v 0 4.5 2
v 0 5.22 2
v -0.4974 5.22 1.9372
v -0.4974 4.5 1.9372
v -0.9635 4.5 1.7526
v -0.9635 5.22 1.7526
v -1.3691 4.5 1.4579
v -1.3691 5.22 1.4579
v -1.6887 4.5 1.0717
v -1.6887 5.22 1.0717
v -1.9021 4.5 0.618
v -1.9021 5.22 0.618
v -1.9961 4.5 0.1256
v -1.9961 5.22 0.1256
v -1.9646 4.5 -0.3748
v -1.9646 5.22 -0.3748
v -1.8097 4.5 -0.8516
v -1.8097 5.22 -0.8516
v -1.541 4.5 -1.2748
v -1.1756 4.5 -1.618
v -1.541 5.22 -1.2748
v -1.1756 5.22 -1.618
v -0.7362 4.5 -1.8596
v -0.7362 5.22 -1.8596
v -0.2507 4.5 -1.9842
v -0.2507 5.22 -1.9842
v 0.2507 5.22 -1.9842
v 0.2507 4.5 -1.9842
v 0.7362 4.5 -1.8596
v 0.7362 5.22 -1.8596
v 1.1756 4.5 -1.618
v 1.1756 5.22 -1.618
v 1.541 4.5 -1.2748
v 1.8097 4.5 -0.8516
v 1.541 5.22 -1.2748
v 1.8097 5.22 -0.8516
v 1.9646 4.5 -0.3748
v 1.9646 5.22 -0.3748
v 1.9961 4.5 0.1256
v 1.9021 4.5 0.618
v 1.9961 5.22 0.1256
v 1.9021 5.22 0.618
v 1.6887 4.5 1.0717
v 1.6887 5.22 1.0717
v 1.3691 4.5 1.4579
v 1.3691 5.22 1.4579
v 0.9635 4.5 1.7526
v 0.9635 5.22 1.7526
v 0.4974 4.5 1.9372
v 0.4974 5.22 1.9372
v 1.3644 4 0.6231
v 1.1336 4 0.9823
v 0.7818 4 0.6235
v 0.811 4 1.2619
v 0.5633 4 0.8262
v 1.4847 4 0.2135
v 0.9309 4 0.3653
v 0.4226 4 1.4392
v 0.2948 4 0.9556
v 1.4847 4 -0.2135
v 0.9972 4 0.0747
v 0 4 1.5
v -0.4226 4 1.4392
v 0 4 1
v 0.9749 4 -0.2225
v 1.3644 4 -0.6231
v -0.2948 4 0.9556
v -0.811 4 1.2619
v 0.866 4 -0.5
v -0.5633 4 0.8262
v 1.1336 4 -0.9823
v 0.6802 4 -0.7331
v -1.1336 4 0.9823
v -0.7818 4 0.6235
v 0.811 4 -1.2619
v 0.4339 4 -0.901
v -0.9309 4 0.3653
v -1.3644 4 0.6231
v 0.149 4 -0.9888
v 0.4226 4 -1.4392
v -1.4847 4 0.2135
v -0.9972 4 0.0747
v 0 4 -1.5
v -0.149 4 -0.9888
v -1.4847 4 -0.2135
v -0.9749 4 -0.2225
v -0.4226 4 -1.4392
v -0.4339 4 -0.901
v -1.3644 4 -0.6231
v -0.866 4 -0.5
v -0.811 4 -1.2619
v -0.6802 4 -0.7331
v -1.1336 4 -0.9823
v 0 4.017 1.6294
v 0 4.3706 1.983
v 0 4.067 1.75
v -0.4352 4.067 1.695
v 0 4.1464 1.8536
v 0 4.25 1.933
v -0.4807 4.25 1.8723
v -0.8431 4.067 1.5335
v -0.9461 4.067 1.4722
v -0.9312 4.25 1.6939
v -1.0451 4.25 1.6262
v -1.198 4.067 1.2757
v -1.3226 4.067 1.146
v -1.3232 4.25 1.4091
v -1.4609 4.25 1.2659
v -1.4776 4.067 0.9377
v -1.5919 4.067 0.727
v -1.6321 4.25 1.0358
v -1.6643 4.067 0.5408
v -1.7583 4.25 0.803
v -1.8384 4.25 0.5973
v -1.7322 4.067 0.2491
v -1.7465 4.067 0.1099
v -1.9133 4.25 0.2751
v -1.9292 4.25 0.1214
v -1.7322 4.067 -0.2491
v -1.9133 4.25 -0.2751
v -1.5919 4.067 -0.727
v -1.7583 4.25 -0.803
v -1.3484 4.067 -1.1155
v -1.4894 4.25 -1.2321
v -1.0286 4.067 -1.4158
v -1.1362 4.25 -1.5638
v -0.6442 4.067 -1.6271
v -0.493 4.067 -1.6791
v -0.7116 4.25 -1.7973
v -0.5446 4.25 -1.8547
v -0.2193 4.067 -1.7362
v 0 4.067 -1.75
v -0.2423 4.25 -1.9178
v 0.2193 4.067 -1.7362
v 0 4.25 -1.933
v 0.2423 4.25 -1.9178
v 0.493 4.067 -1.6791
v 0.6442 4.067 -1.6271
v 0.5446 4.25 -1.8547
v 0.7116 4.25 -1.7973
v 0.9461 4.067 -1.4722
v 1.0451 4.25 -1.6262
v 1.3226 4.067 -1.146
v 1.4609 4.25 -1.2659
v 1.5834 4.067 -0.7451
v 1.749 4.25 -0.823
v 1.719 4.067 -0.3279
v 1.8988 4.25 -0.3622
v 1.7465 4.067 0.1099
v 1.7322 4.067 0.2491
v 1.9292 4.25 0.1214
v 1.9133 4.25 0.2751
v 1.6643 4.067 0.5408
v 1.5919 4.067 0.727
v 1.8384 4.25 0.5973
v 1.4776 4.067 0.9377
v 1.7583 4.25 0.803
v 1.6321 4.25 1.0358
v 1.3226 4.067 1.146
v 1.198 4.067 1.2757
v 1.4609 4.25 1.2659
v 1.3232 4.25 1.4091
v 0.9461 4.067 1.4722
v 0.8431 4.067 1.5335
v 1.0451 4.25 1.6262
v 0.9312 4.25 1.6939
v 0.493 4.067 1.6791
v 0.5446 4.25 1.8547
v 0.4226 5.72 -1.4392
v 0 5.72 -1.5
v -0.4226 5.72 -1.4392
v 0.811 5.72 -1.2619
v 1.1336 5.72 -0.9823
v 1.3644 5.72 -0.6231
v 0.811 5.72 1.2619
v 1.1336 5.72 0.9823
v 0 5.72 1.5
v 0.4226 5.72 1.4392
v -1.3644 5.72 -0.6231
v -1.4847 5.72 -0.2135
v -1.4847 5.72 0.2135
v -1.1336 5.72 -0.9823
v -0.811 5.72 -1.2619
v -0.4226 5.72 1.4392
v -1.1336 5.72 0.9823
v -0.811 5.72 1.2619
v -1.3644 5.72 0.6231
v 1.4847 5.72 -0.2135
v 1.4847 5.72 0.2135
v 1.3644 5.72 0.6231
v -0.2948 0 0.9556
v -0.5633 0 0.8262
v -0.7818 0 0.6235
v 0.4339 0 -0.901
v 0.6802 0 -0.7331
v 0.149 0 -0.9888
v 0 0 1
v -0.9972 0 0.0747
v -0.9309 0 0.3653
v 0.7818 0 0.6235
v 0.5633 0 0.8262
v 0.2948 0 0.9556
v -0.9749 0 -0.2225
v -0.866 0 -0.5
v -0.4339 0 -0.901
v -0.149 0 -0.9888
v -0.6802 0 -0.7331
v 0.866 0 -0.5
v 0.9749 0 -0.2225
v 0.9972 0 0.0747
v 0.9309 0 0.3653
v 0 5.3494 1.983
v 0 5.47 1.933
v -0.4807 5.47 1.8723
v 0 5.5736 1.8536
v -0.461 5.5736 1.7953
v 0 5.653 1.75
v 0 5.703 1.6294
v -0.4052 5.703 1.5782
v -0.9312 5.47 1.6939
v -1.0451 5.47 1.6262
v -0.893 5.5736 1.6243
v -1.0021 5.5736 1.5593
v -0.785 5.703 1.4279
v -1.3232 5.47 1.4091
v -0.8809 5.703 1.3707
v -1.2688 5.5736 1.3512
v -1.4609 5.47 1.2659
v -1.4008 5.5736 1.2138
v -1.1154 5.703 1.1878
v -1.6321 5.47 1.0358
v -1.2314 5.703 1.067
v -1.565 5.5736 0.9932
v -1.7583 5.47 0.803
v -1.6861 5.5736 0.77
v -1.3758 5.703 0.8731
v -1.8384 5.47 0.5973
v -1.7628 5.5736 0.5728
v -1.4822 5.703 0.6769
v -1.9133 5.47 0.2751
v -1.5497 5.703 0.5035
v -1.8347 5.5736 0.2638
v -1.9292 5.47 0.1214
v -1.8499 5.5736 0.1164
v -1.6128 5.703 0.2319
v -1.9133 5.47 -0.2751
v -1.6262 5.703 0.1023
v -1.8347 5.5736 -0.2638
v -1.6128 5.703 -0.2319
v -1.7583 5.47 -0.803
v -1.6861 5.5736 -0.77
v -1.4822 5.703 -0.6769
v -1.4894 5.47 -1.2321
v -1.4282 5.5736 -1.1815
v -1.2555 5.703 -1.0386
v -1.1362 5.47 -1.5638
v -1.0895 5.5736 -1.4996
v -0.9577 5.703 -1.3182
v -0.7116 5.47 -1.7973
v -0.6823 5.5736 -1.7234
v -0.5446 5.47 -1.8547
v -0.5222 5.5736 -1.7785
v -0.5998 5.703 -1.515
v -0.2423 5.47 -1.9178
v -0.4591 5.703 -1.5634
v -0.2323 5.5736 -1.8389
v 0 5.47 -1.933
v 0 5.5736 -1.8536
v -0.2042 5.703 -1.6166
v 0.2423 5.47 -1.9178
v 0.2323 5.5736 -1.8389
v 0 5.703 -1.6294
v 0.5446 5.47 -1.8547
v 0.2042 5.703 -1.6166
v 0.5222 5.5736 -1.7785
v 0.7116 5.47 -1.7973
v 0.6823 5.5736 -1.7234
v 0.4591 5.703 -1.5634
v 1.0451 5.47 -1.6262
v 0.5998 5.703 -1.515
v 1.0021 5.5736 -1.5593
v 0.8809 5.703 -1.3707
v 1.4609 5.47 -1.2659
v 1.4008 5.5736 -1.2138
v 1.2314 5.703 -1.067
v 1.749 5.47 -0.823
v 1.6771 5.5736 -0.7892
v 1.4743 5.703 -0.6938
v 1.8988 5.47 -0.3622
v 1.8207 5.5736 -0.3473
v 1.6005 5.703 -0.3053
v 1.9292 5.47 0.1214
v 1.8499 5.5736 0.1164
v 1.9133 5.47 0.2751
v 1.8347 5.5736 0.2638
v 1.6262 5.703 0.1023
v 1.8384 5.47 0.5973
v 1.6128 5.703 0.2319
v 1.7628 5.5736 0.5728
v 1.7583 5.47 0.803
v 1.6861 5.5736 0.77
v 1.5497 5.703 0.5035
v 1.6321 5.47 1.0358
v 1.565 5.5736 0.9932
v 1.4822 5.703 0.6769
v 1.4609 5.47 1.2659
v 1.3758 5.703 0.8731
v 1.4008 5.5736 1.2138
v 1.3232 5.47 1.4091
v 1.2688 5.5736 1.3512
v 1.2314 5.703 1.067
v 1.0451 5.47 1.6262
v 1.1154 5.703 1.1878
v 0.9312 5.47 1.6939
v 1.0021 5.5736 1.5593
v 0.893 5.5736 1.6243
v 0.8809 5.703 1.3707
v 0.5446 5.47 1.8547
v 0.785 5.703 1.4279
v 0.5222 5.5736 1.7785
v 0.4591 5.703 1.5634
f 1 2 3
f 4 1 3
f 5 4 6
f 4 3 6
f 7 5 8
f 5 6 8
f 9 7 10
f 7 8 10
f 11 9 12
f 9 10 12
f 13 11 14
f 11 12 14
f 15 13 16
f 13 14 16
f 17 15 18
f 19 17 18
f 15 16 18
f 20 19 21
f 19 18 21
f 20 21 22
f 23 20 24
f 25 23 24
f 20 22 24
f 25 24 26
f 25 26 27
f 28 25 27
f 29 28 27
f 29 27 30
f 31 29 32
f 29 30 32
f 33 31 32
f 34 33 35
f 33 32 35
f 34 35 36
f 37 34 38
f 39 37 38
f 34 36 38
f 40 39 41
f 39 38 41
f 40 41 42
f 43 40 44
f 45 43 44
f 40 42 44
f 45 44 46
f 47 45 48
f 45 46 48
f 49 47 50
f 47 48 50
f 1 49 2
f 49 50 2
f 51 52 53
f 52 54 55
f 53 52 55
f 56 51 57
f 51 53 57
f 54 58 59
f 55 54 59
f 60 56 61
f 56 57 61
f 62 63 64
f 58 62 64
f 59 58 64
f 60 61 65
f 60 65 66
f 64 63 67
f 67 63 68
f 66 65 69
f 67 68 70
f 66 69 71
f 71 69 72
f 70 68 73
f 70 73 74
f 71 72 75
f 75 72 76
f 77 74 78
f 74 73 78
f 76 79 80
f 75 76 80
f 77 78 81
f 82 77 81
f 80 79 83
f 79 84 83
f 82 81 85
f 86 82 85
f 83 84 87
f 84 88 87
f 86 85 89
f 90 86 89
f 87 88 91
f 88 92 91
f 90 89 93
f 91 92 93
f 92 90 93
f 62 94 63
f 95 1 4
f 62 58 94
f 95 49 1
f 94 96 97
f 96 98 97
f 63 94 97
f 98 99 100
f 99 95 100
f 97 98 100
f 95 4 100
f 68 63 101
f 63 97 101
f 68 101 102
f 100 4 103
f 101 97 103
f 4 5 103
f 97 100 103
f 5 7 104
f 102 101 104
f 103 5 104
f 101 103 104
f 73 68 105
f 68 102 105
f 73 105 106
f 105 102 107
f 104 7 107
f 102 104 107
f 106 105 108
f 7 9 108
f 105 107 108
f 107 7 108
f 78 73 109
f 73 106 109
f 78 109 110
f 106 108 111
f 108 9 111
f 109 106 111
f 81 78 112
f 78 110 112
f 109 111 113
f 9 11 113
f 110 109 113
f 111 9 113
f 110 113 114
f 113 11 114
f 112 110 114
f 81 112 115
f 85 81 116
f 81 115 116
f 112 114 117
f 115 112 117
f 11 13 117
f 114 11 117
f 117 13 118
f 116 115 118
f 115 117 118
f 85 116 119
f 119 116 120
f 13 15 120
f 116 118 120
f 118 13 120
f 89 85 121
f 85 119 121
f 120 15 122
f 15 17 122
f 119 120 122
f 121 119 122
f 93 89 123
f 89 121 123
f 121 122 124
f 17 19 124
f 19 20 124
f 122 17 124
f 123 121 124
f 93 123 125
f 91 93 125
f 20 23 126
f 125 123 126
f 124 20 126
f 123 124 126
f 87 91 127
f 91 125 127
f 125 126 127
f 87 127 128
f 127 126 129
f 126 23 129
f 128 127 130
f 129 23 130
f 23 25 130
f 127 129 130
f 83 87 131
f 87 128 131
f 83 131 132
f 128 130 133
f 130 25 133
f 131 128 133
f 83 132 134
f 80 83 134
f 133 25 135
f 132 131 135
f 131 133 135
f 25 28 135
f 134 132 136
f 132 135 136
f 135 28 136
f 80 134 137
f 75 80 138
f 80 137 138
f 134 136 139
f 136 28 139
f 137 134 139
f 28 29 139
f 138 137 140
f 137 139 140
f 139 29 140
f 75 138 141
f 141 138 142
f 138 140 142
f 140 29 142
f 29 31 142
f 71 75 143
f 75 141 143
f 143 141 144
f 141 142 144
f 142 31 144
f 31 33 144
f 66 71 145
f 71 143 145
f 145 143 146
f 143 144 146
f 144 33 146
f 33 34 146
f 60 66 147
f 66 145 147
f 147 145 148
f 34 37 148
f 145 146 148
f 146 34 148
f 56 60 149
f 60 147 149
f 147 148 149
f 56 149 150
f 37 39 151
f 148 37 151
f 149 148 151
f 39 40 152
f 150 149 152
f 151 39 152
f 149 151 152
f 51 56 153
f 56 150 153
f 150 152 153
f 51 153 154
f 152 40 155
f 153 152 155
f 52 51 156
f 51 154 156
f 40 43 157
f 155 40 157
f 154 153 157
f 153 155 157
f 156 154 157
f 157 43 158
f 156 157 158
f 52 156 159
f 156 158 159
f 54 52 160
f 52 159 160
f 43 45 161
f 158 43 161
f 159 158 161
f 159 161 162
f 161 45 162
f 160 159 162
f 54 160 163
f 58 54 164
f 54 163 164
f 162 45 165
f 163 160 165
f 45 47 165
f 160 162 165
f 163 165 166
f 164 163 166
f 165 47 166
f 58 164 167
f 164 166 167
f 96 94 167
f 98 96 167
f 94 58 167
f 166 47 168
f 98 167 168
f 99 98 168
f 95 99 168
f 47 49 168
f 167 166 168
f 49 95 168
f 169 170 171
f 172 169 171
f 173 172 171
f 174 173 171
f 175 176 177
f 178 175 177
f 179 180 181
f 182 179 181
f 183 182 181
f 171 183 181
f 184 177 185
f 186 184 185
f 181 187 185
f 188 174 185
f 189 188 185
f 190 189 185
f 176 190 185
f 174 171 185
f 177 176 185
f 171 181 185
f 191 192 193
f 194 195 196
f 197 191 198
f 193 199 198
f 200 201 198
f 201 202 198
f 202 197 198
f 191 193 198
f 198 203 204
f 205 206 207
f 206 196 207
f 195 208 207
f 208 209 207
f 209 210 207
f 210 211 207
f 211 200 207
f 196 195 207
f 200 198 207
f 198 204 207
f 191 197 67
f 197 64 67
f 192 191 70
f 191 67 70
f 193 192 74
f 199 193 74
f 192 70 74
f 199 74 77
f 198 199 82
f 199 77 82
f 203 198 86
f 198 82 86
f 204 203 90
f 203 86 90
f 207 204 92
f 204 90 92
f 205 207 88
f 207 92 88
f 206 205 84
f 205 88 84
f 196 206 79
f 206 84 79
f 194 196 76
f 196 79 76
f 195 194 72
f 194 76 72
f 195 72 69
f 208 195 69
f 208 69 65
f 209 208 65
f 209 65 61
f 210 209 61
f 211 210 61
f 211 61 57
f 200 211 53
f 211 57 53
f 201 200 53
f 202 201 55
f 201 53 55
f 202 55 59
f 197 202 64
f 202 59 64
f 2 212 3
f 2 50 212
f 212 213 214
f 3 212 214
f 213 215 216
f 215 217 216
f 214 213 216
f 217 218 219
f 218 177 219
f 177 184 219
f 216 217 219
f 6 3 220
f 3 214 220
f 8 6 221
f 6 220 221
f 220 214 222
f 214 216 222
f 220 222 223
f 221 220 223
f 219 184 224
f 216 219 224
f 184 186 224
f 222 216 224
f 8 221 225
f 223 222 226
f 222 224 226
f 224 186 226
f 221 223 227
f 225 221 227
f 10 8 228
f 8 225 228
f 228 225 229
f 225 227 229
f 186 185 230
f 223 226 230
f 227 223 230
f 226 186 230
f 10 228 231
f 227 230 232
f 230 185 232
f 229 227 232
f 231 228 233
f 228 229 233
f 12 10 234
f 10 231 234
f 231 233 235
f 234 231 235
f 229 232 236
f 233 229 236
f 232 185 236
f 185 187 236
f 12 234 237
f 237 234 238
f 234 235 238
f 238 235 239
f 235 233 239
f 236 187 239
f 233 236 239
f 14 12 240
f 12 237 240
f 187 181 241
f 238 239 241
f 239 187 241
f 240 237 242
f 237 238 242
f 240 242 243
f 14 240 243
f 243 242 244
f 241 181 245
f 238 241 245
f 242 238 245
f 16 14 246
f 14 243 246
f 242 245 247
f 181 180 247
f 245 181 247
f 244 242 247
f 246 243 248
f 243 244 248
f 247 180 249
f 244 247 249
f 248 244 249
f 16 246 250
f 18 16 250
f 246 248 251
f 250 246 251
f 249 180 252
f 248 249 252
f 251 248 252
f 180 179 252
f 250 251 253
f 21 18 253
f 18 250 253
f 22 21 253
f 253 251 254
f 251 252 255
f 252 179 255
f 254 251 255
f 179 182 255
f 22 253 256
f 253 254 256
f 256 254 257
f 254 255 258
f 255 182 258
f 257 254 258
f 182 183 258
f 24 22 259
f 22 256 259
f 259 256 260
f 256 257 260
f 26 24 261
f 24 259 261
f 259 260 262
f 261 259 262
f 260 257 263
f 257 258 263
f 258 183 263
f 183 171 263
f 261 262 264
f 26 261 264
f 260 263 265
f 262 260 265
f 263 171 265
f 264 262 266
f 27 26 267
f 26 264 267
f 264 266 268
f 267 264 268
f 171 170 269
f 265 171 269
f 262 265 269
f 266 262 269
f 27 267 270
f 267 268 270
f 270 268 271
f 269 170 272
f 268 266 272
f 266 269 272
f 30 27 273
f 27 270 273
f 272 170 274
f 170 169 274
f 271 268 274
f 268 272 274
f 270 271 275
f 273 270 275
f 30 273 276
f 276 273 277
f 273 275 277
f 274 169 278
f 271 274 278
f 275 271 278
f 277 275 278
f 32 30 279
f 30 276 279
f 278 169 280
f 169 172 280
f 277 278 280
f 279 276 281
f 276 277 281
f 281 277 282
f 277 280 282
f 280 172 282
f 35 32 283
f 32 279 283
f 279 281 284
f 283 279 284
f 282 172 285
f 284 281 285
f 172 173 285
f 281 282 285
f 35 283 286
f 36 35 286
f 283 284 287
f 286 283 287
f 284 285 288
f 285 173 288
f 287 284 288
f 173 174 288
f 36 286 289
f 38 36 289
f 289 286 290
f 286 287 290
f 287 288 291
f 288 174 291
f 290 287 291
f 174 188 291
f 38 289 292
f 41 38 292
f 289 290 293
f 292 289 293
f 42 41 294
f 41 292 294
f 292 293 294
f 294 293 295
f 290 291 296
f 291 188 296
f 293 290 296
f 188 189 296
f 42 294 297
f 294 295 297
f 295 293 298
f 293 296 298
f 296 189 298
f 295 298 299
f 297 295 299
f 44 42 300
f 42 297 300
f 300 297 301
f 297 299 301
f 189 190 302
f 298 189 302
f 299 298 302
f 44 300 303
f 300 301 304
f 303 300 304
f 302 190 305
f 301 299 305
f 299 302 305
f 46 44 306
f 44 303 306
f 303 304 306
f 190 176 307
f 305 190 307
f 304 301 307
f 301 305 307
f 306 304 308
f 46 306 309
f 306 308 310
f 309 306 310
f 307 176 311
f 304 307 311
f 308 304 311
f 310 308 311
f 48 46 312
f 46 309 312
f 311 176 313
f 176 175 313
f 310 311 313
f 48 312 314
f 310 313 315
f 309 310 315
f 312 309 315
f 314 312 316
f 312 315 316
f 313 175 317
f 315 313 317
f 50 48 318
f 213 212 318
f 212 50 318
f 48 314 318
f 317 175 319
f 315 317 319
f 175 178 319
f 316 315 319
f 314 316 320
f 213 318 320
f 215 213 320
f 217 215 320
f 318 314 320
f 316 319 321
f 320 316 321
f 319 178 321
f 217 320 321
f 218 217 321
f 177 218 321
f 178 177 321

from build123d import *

# Parameters (mm, degrees)
FILLET1_R = 0.5


with BuildPart() as part:
    # Sketch1 → Revolve1 (revolve)
    with BuildSketch(Plane.XY, mode=Mode.PRIVATE) as revolve1_sk:
        Polygon((0, 0), (-1, 0), (-1, 4), (-2, 4), (-2, 5.72), (0, 5.72), align=None)
    revolve(revolve1_sk.sketch.rotate(Axis((0, 5.72, 0), (0, -1, 0)), 270), axis=Axis((0, 5.72, 0), (0, -1, 0)))

    # Fillet1
    fillet1_edges = [part.edges().sort_by_distance(p)[0] for p in [
        (0, 5.72, -2),
        (0, 4, -2),
    ]]
    fillet(fillet1_edges, radius=FILLET1_R)


solid = part.part
